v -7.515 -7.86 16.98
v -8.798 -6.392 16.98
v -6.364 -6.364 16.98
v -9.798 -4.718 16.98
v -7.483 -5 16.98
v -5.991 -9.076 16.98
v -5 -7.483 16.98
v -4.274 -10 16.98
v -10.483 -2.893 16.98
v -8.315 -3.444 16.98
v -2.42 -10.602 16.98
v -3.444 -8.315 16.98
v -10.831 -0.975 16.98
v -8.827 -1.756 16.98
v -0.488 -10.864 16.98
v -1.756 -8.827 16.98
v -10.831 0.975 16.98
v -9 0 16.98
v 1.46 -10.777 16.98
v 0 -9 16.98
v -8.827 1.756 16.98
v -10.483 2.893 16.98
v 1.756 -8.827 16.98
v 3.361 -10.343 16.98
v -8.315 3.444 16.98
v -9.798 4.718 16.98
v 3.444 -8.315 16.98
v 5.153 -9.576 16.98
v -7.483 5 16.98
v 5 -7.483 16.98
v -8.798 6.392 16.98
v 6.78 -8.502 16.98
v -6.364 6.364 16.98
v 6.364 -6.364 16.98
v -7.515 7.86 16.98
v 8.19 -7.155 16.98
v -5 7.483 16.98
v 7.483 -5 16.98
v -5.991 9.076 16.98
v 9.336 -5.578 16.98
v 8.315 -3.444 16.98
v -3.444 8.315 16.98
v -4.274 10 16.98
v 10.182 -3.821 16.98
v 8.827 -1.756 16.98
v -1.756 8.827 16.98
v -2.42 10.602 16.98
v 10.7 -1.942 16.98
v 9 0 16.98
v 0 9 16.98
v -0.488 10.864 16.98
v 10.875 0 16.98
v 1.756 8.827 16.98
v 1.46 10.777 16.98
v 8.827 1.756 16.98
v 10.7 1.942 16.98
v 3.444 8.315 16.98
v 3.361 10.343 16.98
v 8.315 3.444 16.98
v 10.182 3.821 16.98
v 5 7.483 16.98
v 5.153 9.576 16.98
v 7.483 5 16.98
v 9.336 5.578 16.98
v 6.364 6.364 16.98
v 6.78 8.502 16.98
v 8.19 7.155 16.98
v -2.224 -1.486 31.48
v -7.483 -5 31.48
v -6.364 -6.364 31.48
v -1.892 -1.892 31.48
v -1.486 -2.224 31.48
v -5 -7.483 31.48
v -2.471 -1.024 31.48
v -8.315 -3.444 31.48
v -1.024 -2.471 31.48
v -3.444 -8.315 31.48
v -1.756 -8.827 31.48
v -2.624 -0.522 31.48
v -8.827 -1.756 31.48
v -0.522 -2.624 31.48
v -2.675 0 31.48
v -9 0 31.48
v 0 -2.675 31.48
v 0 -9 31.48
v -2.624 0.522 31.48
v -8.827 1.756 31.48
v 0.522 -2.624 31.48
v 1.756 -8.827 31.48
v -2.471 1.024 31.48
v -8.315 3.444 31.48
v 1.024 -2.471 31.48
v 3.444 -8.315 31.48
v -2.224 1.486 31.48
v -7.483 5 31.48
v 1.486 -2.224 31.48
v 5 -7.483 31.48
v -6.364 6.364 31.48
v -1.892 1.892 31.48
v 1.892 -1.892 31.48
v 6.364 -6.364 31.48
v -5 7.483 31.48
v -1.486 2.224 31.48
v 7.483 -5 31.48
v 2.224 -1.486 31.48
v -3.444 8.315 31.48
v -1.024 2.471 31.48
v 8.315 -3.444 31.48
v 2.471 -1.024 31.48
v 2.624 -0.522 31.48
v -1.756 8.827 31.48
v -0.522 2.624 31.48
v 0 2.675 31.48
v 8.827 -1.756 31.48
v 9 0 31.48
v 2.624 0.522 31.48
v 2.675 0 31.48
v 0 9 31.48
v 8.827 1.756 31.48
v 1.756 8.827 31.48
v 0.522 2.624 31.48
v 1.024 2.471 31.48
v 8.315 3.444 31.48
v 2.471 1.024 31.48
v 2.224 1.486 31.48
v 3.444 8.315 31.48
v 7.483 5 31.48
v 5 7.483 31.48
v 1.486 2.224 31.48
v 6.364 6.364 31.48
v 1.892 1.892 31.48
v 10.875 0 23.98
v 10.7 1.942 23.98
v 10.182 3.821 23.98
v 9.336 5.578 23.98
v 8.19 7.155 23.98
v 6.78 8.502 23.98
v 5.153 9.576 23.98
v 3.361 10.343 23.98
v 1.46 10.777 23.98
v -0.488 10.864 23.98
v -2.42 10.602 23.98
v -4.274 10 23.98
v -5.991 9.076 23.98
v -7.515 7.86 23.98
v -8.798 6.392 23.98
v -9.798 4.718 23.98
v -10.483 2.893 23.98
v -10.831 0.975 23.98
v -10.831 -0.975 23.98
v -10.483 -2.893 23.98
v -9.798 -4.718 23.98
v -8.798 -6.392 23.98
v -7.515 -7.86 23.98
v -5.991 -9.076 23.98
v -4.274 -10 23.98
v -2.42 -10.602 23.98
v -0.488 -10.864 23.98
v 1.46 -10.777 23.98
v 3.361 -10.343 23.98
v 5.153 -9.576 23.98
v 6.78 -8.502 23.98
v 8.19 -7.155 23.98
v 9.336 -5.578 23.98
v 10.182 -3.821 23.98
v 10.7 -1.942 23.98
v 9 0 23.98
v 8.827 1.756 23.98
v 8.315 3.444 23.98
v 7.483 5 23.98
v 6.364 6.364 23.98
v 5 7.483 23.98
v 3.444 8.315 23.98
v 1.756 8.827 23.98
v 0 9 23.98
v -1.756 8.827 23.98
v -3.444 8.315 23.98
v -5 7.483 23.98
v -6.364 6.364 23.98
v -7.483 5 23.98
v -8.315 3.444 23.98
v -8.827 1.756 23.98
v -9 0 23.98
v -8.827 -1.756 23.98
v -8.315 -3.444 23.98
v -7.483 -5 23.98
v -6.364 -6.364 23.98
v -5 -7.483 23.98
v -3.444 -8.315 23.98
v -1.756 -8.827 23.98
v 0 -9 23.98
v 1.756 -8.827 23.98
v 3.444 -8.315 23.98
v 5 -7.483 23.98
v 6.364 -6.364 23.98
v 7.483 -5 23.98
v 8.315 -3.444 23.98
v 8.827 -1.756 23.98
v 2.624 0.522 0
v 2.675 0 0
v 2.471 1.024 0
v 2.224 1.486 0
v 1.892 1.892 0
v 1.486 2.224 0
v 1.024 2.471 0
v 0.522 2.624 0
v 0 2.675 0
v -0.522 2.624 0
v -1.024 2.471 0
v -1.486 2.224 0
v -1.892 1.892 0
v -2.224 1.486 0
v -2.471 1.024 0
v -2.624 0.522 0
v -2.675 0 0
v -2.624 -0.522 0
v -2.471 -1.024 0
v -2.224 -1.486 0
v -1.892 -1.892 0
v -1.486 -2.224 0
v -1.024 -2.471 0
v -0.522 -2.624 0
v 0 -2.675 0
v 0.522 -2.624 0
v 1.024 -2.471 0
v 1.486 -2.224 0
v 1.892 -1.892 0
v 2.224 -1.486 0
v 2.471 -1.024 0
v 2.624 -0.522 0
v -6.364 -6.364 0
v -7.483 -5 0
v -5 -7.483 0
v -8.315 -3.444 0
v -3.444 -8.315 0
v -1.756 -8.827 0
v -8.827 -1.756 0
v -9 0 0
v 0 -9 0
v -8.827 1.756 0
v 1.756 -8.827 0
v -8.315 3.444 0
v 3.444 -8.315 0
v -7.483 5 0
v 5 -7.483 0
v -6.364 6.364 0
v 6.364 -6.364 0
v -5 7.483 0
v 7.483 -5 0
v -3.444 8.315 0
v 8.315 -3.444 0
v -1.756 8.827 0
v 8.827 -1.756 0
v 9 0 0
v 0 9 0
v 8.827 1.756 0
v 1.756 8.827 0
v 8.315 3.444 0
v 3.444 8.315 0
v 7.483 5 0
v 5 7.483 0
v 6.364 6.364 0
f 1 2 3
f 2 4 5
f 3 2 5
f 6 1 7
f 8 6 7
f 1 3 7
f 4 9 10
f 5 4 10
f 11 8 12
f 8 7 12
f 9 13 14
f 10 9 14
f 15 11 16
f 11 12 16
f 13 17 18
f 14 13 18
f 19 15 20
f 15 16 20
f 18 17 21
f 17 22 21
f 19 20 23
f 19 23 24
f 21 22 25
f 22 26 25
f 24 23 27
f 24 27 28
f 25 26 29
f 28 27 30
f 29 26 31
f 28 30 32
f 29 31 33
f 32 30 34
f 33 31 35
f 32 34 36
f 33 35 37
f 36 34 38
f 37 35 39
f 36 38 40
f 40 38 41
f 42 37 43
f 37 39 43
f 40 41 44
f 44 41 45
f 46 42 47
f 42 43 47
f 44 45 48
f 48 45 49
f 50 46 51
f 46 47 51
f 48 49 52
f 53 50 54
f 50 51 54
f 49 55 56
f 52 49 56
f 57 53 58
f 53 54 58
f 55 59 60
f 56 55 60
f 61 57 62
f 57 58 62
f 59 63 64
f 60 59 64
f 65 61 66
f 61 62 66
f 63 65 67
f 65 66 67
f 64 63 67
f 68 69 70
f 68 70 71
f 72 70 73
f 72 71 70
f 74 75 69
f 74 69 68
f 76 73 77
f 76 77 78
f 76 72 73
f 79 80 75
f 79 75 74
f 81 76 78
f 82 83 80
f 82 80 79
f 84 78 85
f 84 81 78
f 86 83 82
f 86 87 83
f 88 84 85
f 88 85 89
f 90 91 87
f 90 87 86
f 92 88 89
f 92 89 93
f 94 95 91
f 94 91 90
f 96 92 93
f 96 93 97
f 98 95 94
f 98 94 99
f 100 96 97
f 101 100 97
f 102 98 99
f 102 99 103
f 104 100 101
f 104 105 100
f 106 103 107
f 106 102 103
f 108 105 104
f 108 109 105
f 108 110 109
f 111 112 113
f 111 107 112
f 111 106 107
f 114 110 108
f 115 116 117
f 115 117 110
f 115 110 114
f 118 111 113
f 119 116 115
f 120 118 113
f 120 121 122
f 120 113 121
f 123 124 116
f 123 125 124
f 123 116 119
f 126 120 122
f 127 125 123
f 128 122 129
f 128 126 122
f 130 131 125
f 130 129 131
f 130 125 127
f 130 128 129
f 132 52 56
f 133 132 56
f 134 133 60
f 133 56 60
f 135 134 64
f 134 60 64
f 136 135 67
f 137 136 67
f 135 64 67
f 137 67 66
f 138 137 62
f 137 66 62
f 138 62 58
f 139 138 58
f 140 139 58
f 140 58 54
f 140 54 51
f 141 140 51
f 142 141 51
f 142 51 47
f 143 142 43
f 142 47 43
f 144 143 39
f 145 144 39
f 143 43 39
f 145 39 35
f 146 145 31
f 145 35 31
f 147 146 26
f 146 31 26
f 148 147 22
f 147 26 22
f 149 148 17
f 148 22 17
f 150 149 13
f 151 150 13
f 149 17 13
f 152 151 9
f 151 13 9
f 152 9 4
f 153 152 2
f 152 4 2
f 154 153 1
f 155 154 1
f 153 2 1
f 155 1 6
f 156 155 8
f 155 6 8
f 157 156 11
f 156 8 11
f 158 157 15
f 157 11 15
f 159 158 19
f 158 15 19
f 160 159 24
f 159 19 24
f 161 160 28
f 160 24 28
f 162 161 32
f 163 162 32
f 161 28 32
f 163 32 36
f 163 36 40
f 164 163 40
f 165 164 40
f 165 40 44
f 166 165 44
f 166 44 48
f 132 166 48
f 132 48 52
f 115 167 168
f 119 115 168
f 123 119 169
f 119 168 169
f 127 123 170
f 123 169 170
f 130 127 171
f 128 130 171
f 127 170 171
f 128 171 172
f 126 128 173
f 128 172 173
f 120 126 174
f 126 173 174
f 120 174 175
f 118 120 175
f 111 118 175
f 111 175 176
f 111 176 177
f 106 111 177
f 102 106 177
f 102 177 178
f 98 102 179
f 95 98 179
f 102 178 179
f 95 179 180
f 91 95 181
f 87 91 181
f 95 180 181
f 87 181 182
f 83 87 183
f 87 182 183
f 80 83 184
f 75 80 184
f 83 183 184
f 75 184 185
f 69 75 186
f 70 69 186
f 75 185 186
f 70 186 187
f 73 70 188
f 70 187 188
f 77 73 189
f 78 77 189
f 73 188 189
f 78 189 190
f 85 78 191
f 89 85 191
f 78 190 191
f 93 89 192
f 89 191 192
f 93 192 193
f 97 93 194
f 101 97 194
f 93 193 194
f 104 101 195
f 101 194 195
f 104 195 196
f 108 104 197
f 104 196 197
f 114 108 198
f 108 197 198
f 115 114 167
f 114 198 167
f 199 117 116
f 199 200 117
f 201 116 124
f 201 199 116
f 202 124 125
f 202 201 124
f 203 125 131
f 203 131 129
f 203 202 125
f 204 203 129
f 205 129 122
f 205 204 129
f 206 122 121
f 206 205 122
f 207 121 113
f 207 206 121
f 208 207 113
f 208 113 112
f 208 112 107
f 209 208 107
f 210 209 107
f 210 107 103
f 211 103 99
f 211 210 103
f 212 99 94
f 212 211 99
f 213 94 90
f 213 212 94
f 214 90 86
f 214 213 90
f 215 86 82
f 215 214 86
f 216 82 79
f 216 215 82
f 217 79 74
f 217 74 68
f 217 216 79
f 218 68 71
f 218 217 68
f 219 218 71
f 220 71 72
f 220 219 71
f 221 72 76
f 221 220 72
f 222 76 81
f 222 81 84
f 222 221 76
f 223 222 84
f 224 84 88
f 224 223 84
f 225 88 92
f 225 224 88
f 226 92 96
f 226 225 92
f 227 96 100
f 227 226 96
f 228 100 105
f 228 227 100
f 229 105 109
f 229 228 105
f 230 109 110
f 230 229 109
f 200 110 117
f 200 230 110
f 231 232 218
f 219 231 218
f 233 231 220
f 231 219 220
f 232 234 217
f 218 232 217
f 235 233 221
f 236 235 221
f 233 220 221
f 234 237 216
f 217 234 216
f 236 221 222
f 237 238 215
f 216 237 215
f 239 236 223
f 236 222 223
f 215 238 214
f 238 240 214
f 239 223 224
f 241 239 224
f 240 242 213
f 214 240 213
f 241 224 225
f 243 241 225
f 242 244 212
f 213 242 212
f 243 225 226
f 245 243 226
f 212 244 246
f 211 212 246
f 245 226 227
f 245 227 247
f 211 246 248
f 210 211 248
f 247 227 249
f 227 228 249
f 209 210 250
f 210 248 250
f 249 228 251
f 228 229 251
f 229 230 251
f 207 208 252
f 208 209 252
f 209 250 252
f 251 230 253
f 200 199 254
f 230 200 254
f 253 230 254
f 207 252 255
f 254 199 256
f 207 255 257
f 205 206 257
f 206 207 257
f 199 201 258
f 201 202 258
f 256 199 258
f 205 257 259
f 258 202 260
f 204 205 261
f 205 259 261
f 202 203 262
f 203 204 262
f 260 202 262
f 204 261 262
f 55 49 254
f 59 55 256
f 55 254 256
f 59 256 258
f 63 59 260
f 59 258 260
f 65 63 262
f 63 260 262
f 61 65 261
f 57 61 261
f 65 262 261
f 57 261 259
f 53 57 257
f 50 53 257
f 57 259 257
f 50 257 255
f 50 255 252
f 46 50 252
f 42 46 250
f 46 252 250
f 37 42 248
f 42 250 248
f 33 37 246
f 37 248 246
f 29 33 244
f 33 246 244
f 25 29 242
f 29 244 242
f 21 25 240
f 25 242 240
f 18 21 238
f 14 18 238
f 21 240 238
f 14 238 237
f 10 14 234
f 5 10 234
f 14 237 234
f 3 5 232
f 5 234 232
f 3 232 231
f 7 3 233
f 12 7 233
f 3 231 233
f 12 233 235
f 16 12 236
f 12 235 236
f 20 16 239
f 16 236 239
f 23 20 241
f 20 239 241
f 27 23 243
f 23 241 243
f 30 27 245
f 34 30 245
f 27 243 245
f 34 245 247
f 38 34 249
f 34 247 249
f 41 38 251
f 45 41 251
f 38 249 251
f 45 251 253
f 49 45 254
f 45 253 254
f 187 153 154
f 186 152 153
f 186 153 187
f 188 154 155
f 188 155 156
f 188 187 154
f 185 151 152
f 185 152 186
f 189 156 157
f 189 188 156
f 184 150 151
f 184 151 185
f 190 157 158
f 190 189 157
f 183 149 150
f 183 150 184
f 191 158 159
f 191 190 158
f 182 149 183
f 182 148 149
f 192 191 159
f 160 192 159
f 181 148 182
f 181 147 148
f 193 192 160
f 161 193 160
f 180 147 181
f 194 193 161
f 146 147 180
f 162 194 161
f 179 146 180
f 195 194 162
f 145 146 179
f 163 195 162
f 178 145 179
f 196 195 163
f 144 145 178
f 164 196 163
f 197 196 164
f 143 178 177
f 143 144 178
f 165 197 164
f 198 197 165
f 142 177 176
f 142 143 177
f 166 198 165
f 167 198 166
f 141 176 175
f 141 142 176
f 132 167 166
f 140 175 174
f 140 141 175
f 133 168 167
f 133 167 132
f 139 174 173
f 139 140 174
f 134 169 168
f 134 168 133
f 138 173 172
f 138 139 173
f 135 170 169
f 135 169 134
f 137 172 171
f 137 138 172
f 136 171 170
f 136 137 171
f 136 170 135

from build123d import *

# Parameters (mm, degrees)
SKETCH1_R           = 9
SKETCH1_R_2         = 2.675
BOSS_EXTRUDE1_DEPTH = 16.98
SKETCH2_R           = 10.875
SKETCH2_R_2         = 2.675
BOSS_EXTRUDE2_DEPTH = 7
SKETCH4_R           = 9
SKETCH4_R_2         = 2.675
BOSS_EXTRUDE3_DEPTH = 7.5


with BuildPart() as part:
    # Sketch1 → Boss-Extrude1 (new body)
    with BuildSketch(Plane.XY):
        Circle(SKETCH1_R)
        Circle(SKETCH1_R_2, mode=Mode.SUBTRACT)
    extrude(amount=BOSS_EXTRUDE1_DEPTH)

    # Sketch2 → Boss-Extrude2 (add)
    with BuildSketch(Plane.XY.offset(16.98)):
        Circle(SKETCH2_R)
        Circle(SKETCH2_R_2, mode=Mode.SUBTRACT)
    extrude(amount=BOSS_EXTRUDE2_DEPTH)

    # Sketch4 → Boss-Extrude3 (add)
    with BuildSketch(Plane.XY.offset(23.98)):
        Circle(SKETCH4_R)
        Circle(SKETCH4_R_2, mode=Mode.SUBTRACT)
    extrude(amount=BOSS_EXTRUDE3_DEPTH)


solid = part.part
